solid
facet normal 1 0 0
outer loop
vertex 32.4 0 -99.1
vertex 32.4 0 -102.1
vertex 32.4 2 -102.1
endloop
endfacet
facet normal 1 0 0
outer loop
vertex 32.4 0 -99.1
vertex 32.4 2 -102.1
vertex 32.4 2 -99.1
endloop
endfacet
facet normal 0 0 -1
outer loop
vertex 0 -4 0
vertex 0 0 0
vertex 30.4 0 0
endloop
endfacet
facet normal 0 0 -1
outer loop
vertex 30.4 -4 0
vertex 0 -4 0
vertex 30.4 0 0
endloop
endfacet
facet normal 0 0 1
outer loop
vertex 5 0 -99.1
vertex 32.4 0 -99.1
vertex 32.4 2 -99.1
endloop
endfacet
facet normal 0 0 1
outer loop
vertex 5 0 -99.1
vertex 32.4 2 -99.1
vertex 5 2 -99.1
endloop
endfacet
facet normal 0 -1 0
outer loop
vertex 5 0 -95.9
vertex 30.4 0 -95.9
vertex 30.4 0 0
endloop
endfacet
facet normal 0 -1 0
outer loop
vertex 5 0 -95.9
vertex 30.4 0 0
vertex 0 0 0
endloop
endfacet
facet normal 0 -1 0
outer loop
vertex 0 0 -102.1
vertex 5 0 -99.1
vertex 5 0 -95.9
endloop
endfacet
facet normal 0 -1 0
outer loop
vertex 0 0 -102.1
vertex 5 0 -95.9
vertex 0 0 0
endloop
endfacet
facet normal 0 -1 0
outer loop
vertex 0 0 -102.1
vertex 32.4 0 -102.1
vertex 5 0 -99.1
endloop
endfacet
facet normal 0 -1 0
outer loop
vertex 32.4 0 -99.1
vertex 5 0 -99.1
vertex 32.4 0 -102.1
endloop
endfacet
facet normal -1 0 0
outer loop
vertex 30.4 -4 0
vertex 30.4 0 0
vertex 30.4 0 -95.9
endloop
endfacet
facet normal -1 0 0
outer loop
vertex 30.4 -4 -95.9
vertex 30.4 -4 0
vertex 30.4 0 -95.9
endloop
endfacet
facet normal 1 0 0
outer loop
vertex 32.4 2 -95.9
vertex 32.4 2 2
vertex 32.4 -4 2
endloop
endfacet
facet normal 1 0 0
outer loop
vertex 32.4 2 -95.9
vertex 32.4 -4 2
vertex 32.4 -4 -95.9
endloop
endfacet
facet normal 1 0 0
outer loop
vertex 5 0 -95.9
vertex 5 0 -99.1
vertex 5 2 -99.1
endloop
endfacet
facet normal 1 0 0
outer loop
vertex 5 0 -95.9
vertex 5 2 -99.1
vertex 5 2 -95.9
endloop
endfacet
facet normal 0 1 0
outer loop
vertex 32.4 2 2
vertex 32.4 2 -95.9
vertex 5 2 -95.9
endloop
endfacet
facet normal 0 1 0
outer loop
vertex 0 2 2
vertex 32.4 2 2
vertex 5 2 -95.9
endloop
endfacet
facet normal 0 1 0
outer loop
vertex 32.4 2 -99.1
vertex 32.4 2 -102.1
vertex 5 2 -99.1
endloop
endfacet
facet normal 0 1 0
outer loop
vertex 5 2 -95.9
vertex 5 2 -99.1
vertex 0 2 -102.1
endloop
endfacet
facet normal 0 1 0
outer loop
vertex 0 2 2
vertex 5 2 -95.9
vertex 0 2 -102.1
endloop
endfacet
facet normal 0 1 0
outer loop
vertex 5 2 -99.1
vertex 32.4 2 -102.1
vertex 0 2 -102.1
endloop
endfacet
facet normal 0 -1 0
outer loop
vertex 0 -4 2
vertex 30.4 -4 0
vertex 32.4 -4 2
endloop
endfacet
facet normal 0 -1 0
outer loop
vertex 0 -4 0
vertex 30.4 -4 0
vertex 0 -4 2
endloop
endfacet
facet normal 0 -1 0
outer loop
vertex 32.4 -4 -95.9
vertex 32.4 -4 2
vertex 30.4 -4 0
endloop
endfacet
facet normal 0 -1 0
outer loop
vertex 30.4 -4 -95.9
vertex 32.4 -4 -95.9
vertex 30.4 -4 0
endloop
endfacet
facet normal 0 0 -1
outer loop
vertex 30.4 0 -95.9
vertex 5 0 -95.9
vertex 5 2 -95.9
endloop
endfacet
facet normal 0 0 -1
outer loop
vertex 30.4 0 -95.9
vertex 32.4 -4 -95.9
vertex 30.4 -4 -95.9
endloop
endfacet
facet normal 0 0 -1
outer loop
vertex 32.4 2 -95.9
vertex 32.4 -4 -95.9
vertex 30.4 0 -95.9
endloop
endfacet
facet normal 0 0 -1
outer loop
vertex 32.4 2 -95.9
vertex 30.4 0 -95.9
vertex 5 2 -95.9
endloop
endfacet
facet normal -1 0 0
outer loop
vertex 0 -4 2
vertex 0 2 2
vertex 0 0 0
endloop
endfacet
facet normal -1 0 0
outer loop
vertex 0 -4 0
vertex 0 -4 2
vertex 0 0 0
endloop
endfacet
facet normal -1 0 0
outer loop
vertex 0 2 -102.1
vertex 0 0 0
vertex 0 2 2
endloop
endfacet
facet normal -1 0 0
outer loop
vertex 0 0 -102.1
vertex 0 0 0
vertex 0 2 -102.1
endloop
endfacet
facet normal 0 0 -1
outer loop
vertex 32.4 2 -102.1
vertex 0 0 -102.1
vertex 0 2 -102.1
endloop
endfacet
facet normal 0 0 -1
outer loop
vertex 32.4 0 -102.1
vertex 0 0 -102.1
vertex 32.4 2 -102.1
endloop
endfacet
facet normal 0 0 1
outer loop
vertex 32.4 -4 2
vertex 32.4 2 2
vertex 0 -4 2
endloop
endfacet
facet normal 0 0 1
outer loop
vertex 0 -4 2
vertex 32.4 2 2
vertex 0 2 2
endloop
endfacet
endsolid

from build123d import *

# Parameters (mm, degrees)
BOSS_EXTRUDE1_DEPTH = 2
BOSS_EXTRUDE3_DEPTH = 6
SKETCH7_W           = 80.2
SKETCH7_H           = 2
BOSS_EXTRUDE4_DEPTH = 18.2
BOSS_EXTRUDE5_DEPTH = 2


with BuildPart() as part:
    # Sketch1 → Boss-Extrude1 (new body)
    with BuildSketch(Plane(origin=(0, 0, 0), x_dir=(1, 0, 0), z_dir=(0, 1, 0))):
        Polygon((0, 0), (30.4, 0), (30.4, 95.9), (18.2, 95.9), (18.2, 15.7), (0, 15.7), align=None)
    extrude(amount=BOSS_EXTRUDE1_DEPTH)

    # Sketch4 → Boss-Extrude3 (add)
    with BuildSketch(Plane(origin=(0, 2, 0), x_dir=(1, 0, 0), z_dir=(0, 1, 0))):
        Polygon((0, -2), (0, 0), (30.4, 0), (30.4, 95.9), (32.4, 95.9), (32.4, 0), (32.4, -2), align=None)
    extrude(amount=-BOSS_EXTRUDE3_DEPTH)

    # Sketch7 → Boss-Extrude4 (add)
    with BuildSketch(Plane.ZY.offset(-18.2)):
        with Locations((-55.8, 1)):
            Rectangle(SKETCH7_W, SKETCH7_H)
    extrude(amount=BOSS_EXTRUDE4_DEPTH)

    # Sketch8 → Boss-Extrude5 (add)
    with BuildSketch(Plane(origin=(0, 0, 0), x_dir=(-1, 0, 0), z_dir=(0, -1, 0))):
        Polygon((-5, 95.9), (0, 95.9), (0, 102.1), (-32.4, 102.1), (-32.4, 99.1), (-5, 99.1), align=None)
    extrude(amount=-BOSS_EXTRUDE5_DEPTH)


solid = part.part
